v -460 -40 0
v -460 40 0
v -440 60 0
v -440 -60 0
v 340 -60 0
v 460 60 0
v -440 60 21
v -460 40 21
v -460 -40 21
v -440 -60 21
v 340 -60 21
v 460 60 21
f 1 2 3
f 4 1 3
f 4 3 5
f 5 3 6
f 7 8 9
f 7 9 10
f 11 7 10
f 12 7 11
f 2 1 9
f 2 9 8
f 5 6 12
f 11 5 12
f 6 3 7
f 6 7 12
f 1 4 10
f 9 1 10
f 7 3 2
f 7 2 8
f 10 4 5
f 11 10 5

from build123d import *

# Parameters (mm, degrees)
F0_W     = 920
F0_H     = 120
F1_DEPTH = 21
F2_SIZE  = 20
F3_SIZE  = 119.99999


# Not quite as in the source:
# - a fillet or chamfer is up to 0.001 mm smaller than in the source, because OpenCascade refuses the exact size


with BuildPart() as f1:
    # F0 (on Top) → F1 (new body)
    with BuildSketch(Plane.XY):
        Rectangle(F0_W, F0_H)
    extrude(amount=F1_DEPTH)

    # F2
    f2_edges = [f1.edges().sort_by_distance(p)[0] for p in [
        (-460, 60, 10.5),
        (-460, -60, 10.5),
    ]]
    chamfer(f2_edges, length=F2_SIZE)

    # F3 (size 120 in the source; OpenCascade refuses exactly that, so slightly less here)
    f3_edges = [f1.edges().sort_by_distance(p)[0] for p in [
        (460, -60, 10.5),
    ]]
    chamfer(f3_edges, length=F3_SIZE)


solid = f1.part
